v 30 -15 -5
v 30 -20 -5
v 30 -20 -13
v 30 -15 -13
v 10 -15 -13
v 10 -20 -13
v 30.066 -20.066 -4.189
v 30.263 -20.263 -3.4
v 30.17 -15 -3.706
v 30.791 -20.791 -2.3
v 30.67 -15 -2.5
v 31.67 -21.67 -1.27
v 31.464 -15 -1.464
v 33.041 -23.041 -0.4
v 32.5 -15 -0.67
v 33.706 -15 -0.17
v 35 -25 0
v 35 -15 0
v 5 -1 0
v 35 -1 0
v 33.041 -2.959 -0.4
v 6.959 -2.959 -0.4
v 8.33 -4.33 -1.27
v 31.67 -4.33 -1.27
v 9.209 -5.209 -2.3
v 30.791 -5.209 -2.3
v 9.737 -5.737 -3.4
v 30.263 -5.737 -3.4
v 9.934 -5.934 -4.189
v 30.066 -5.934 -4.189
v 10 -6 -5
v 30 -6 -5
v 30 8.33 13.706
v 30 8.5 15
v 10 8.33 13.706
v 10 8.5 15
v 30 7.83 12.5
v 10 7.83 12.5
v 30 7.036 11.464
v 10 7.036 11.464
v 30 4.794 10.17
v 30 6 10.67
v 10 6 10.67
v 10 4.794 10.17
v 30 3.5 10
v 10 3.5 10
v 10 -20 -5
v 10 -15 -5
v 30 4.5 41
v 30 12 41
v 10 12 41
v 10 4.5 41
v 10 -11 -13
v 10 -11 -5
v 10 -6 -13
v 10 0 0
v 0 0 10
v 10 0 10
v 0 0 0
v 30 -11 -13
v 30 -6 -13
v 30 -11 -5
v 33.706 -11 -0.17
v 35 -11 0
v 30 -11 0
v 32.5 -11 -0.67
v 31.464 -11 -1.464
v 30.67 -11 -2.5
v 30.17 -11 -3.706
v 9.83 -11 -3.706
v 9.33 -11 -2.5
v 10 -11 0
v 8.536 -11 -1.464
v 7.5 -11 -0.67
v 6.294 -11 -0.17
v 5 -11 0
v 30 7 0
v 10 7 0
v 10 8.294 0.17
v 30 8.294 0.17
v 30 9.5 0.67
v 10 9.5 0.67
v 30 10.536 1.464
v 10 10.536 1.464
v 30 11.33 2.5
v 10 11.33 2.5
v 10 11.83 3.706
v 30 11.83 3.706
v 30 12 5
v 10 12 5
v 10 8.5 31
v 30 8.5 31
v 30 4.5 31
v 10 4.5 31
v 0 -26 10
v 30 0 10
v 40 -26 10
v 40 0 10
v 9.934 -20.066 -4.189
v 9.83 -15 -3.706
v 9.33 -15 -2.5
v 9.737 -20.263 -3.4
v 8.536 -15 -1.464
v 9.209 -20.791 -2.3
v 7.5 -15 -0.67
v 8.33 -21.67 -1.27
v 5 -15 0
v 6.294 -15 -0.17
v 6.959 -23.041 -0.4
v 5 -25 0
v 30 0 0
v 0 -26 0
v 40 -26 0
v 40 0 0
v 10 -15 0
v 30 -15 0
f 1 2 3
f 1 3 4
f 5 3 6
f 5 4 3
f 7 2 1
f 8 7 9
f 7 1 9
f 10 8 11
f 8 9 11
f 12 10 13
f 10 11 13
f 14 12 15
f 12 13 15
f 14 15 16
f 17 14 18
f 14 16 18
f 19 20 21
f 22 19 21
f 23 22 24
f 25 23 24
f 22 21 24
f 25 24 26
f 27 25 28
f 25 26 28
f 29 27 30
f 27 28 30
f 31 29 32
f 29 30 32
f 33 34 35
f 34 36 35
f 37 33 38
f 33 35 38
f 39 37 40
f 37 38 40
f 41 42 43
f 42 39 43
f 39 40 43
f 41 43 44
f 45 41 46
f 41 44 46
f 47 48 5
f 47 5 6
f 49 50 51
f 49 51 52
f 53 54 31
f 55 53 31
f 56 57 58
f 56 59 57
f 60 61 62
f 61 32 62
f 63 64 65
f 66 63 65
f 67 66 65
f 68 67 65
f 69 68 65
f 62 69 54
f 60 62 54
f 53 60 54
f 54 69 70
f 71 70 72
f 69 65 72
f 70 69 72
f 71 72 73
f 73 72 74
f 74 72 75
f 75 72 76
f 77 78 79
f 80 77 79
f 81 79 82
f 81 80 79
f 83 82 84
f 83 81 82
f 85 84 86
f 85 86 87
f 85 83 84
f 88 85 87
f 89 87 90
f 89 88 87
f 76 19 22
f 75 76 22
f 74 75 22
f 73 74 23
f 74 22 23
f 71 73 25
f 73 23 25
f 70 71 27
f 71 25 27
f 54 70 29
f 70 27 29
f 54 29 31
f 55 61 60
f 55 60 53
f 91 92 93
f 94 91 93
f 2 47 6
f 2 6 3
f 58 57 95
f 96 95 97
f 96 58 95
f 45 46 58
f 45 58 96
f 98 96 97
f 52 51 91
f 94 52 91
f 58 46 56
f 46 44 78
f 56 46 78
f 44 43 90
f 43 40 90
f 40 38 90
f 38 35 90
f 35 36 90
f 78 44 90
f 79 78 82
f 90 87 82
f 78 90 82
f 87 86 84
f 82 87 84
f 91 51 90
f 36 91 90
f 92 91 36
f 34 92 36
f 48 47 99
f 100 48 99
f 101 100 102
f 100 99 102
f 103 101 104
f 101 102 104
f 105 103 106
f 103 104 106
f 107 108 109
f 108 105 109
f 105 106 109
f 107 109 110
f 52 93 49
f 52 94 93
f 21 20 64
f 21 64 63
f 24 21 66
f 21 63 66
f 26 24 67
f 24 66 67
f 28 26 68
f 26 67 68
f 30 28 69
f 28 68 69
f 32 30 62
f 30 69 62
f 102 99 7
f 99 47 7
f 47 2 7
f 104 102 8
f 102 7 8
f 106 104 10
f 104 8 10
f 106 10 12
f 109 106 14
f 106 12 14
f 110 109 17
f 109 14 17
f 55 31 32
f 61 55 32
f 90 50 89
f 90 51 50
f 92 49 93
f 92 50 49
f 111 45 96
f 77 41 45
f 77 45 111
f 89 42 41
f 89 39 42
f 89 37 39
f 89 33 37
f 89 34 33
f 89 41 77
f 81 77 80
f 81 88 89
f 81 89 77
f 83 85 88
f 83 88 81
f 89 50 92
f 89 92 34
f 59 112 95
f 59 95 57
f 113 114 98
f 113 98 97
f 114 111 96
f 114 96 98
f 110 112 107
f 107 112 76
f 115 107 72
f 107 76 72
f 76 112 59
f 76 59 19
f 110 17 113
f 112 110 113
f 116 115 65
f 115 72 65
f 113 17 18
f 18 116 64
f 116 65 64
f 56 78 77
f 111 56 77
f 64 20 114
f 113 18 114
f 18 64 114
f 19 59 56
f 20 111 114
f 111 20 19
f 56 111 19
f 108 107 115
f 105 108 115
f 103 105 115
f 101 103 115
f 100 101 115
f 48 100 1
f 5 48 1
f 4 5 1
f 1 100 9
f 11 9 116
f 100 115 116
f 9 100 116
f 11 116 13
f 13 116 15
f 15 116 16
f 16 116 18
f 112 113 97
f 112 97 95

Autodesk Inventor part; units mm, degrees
ref_plane "YZ Plane" through (0, 0, 0) normal (1, 0, 0) x (0, 1, 0)
ref_plane "XZ Plane" through (0, 0, 0) normal (0, 1, 0) x (-1, 0, 0)
ref_plane "XY Plane" through (0, 0, 0) normal (0, 0, 1) x (1, 0, 0)
sketch "草图1" plane through (0, 0, 0) normal (0, 0, 1) x (1, 0, 0)
  line L0 (0, 0) -> (40, 0)
  line L1 (40, 0) -> (40, -26)
  line L2 (40, -26) -> (0, -26)
  line L3 (0, -26) -> (0, 0)
  dimension "d0" = 40
  dimension "d1" = 26
extrude "拉伸1" add sketch "草图1" along normal blind 10
ref_plane "工作平面1" through (20, -26, 0) normal (1, 0, 0) x (0, 0, -1)
sketch "草图2" plane through (20, -26, 0) normal (1, 0, 0) x (0, 0, -1)
  line L0 (0, 26) -> (-10, 26) projected
  line L1 (0, 26) -> (-10, 26)
  line L2 (-10, 26) -> (-10, 38)
  line L3 (-10, 38) -> (0, 38)
  line L4 (0, 38) -> (0, 26)
  line L5 (-10, 38) -> (-41, 38)
  line L6 (-41, 38) -> (-41, 34.5)
  line L7 (-41, 34.5) -> (-10, 34.5)
  line L8 (-10, 34.5) -> (-10, 38)
  line L9 (-41, 34.5) -> (-31, 34.5)
  line L10 (-31, 34.5) -> (-31, 30.5)
  line L11 (-31, 30.5) -> (-41, 30.5)
  line L12 (-41, 30.5) -> (-41, 34.5)
  dimension "d5" = 10
  dimension "d6" = 12
  dimension "d7" = 31
  dimension "d8" = 3.5
  dimension "d9" = 10
  dimension "d10" = 4
extrude "拉伸2" add sketch "草图2" along normal mid plane 20
sketch "草图3" plane through (0, 0, 0) normal (0, 0, -1) x (-1, 0, 0)
  line L0 (-30, -11) -> (-10, -11)
  line L1 (-10, -11) -> (-10, -15)
  line L2 (-10, -15) -> (-30, -15)
  line L3 (-30, -15) -> (-30, -11)
  line L4 (-40, 0) -> (-30, 0) projected
  line L5 (-40, -26) -> (-40, 0) projected
  line L6 (-30, -11) -> (-10, -11)
  line L7 (-10, -11) -> (-10, -6)
  line L8 (-10, -6) -> (-30, -6)
  line L9 (-30, -6) -> (-30, -11)
  line L10 (-30, -15) -> (-10, -15)
  line L11 (-10, -15) -> (-10, -20)
  line L12 (-10, -20) -> (-30, -20)
  line L13 (-30, -20) -> (-30, -15)
  point P0 (0, 0)
  dimension "d13" = 20
  dimension "d14" = 4
  dimension "d15" = 11
  dimension "d16" = 10
  dimension "d17" = 5
  dimension "d18" = 20
  dimension "d19" = 5
extrude "拉伸3" add sketch "草图3" along normal blind 13 contours L9 L8 L7 L0 | L2 L11 L12 L13
fillet "圆角1" radius 5 6 edges at (30, -8.5, 0) (20, -6, 0) (10, -8.5, 0) (10, -17.5, 0) (20, -20, 0) (30, -17.5, 0)
fillet "圆角2" radius 5 2 edges at (20, 12, 0) (20, 8.5, 10)
properties part number "连接件"
